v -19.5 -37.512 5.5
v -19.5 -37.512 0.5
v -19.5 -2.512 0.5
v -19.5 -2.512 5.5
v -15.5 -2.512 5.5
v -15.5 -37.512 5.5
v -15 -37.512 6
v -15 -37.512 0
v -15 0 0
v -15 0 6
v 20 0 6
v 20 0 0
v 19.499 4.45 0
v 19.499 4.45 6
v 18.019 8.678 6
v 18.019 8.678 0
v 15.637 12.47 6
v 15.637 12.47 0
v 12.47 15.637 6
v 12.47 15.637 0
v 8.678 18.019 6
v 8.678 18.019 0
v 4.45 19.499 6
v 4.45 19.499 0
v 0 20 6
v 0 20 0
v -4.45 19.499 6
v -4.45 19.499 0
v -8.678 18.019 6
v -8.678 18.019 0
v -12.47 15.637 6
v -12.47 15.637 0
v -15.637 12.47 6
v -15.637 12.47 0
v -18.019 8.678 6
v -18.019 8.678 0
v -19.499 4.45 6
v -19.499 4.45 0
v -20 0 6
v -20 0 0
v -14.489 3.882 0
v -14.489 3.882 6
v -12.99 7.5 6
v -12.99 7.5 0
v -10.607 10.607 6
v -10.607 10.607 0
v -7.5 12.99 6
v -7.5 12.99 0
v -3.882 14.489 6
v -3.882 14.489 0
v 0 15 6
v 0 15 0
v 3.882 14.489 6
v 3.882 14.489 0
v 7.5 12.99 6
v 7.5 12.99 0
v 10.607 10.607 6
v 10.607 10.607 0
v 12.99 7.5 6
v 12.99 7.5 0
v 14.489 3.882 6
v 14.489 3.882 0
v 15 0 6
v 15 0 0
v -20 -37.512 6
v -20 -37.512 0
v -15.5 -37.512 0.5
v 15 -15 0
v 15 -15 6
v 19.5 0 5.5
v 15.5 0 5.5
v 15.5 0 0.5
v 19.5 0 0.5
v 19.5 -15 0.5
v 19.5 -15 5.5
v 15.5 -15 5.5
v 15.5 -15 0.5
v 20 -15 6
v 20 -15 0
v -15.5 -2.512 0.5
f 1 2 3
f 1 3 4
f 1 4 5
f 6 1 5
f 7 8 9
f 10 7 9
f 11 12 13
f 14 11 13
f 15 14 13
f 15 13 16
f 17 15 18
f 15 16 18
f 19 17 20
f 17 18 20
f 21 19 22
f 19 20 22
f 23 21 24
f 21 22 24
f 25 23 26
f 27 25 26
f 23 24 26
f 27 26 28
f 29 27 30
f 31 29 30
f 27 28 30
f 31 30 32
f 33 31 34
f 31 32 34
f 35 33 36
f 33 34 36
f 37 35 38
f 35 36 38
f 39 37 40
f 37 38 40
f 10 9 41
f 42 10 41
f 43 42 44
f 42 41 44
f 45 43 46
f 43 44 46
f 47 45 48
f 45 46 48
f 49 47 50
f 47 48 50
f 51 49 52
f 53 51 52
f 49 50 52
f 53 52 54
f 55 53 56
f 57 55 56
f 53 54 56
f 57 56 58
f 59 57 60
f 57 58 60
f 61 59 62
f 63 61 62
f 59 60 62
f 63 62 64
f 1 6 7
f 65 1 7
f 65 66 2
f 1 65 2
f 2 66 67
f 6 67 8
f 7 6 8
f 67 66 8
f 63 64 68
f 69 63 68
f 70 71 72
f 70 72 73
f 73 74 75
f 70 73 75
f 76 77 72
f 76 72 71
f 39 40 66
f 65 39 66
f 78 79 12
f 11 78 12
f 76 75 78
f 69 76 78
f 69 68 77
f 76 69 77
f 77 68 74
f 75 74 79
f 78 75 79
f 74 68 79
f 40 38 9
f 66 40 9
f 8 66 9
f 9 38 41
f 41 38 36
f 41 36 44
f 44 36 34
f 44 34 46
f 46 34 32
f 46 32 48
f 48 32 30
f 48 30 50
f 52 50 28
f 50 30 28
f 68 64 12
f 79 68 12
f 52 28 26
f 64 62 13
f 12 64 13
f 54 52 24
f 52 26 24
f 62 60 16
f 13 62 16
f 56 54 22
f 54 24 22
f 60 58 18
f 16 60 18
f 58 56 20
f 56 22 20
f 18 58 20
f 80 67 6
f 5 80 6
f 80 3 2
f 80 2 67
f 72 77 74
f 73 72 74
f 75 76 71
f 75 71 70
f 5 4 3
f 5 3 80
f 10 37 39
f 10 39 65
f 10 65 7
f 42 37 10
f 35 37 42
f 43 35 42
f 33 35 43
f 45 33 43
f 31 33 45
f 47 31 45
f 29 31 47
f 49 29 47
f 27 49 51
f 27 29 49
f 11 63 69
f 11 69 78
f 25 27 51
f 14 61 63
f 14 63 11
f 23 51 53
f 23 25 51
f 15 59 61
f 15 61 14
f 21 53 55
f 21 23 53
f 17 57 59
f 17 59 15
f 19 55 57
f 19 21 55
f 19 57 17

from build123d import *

# Parameters (mm, degrees)
F1_DEPTH = 6
F2_W     = 4
F2_H     = 5
F3_DEPTH = 15
F4_W     = 4
F4_H     = 5
F5_DEPTH = 35


with BuildPart() as f1:
    # F0 (on Top) → F1 (new body)
    with BuildSketch(Plane.XY):
        with BuildLine():
            ThreePointArc((-15, 0), (0, 15), (15, 0))
            Line((15, 0), (15, -15))
            Line((15, -15), (20, -15))
            Line((20, -15), (20, 0))
            ThreePointArc((20, 0), (0, 20), (-20, 0))
            Line((-20, 0), (-20, -37.512027))
            Line((-20, -37.512027), (-15, -37.512027))
            Line((-15, -37.512027), (-15, 0))
        make_face()
    extrude(amount=F1_DEPTH)

    # F2 (on face) → F3 (cut)
    with BuildSketch(Plane.XZ.offset(15)):
        with Locations((17.5, 3)):
            Rectangle(F2_W, F2_H)
    extrude(amount=-F3_DEPTH, mode=Mode.SUBTRACT)

    # F4 (on face) → F5 (cut)
    with BuildSketch(Plane.XZ.offset(37.512027)):
        with Locations((-17.5, 3)):
            Rectangle(F4_W, F4_H)
    extrude(amount=-F5_DEPTH, mode=Mode.SUBTRACT)


solid = f1.part
